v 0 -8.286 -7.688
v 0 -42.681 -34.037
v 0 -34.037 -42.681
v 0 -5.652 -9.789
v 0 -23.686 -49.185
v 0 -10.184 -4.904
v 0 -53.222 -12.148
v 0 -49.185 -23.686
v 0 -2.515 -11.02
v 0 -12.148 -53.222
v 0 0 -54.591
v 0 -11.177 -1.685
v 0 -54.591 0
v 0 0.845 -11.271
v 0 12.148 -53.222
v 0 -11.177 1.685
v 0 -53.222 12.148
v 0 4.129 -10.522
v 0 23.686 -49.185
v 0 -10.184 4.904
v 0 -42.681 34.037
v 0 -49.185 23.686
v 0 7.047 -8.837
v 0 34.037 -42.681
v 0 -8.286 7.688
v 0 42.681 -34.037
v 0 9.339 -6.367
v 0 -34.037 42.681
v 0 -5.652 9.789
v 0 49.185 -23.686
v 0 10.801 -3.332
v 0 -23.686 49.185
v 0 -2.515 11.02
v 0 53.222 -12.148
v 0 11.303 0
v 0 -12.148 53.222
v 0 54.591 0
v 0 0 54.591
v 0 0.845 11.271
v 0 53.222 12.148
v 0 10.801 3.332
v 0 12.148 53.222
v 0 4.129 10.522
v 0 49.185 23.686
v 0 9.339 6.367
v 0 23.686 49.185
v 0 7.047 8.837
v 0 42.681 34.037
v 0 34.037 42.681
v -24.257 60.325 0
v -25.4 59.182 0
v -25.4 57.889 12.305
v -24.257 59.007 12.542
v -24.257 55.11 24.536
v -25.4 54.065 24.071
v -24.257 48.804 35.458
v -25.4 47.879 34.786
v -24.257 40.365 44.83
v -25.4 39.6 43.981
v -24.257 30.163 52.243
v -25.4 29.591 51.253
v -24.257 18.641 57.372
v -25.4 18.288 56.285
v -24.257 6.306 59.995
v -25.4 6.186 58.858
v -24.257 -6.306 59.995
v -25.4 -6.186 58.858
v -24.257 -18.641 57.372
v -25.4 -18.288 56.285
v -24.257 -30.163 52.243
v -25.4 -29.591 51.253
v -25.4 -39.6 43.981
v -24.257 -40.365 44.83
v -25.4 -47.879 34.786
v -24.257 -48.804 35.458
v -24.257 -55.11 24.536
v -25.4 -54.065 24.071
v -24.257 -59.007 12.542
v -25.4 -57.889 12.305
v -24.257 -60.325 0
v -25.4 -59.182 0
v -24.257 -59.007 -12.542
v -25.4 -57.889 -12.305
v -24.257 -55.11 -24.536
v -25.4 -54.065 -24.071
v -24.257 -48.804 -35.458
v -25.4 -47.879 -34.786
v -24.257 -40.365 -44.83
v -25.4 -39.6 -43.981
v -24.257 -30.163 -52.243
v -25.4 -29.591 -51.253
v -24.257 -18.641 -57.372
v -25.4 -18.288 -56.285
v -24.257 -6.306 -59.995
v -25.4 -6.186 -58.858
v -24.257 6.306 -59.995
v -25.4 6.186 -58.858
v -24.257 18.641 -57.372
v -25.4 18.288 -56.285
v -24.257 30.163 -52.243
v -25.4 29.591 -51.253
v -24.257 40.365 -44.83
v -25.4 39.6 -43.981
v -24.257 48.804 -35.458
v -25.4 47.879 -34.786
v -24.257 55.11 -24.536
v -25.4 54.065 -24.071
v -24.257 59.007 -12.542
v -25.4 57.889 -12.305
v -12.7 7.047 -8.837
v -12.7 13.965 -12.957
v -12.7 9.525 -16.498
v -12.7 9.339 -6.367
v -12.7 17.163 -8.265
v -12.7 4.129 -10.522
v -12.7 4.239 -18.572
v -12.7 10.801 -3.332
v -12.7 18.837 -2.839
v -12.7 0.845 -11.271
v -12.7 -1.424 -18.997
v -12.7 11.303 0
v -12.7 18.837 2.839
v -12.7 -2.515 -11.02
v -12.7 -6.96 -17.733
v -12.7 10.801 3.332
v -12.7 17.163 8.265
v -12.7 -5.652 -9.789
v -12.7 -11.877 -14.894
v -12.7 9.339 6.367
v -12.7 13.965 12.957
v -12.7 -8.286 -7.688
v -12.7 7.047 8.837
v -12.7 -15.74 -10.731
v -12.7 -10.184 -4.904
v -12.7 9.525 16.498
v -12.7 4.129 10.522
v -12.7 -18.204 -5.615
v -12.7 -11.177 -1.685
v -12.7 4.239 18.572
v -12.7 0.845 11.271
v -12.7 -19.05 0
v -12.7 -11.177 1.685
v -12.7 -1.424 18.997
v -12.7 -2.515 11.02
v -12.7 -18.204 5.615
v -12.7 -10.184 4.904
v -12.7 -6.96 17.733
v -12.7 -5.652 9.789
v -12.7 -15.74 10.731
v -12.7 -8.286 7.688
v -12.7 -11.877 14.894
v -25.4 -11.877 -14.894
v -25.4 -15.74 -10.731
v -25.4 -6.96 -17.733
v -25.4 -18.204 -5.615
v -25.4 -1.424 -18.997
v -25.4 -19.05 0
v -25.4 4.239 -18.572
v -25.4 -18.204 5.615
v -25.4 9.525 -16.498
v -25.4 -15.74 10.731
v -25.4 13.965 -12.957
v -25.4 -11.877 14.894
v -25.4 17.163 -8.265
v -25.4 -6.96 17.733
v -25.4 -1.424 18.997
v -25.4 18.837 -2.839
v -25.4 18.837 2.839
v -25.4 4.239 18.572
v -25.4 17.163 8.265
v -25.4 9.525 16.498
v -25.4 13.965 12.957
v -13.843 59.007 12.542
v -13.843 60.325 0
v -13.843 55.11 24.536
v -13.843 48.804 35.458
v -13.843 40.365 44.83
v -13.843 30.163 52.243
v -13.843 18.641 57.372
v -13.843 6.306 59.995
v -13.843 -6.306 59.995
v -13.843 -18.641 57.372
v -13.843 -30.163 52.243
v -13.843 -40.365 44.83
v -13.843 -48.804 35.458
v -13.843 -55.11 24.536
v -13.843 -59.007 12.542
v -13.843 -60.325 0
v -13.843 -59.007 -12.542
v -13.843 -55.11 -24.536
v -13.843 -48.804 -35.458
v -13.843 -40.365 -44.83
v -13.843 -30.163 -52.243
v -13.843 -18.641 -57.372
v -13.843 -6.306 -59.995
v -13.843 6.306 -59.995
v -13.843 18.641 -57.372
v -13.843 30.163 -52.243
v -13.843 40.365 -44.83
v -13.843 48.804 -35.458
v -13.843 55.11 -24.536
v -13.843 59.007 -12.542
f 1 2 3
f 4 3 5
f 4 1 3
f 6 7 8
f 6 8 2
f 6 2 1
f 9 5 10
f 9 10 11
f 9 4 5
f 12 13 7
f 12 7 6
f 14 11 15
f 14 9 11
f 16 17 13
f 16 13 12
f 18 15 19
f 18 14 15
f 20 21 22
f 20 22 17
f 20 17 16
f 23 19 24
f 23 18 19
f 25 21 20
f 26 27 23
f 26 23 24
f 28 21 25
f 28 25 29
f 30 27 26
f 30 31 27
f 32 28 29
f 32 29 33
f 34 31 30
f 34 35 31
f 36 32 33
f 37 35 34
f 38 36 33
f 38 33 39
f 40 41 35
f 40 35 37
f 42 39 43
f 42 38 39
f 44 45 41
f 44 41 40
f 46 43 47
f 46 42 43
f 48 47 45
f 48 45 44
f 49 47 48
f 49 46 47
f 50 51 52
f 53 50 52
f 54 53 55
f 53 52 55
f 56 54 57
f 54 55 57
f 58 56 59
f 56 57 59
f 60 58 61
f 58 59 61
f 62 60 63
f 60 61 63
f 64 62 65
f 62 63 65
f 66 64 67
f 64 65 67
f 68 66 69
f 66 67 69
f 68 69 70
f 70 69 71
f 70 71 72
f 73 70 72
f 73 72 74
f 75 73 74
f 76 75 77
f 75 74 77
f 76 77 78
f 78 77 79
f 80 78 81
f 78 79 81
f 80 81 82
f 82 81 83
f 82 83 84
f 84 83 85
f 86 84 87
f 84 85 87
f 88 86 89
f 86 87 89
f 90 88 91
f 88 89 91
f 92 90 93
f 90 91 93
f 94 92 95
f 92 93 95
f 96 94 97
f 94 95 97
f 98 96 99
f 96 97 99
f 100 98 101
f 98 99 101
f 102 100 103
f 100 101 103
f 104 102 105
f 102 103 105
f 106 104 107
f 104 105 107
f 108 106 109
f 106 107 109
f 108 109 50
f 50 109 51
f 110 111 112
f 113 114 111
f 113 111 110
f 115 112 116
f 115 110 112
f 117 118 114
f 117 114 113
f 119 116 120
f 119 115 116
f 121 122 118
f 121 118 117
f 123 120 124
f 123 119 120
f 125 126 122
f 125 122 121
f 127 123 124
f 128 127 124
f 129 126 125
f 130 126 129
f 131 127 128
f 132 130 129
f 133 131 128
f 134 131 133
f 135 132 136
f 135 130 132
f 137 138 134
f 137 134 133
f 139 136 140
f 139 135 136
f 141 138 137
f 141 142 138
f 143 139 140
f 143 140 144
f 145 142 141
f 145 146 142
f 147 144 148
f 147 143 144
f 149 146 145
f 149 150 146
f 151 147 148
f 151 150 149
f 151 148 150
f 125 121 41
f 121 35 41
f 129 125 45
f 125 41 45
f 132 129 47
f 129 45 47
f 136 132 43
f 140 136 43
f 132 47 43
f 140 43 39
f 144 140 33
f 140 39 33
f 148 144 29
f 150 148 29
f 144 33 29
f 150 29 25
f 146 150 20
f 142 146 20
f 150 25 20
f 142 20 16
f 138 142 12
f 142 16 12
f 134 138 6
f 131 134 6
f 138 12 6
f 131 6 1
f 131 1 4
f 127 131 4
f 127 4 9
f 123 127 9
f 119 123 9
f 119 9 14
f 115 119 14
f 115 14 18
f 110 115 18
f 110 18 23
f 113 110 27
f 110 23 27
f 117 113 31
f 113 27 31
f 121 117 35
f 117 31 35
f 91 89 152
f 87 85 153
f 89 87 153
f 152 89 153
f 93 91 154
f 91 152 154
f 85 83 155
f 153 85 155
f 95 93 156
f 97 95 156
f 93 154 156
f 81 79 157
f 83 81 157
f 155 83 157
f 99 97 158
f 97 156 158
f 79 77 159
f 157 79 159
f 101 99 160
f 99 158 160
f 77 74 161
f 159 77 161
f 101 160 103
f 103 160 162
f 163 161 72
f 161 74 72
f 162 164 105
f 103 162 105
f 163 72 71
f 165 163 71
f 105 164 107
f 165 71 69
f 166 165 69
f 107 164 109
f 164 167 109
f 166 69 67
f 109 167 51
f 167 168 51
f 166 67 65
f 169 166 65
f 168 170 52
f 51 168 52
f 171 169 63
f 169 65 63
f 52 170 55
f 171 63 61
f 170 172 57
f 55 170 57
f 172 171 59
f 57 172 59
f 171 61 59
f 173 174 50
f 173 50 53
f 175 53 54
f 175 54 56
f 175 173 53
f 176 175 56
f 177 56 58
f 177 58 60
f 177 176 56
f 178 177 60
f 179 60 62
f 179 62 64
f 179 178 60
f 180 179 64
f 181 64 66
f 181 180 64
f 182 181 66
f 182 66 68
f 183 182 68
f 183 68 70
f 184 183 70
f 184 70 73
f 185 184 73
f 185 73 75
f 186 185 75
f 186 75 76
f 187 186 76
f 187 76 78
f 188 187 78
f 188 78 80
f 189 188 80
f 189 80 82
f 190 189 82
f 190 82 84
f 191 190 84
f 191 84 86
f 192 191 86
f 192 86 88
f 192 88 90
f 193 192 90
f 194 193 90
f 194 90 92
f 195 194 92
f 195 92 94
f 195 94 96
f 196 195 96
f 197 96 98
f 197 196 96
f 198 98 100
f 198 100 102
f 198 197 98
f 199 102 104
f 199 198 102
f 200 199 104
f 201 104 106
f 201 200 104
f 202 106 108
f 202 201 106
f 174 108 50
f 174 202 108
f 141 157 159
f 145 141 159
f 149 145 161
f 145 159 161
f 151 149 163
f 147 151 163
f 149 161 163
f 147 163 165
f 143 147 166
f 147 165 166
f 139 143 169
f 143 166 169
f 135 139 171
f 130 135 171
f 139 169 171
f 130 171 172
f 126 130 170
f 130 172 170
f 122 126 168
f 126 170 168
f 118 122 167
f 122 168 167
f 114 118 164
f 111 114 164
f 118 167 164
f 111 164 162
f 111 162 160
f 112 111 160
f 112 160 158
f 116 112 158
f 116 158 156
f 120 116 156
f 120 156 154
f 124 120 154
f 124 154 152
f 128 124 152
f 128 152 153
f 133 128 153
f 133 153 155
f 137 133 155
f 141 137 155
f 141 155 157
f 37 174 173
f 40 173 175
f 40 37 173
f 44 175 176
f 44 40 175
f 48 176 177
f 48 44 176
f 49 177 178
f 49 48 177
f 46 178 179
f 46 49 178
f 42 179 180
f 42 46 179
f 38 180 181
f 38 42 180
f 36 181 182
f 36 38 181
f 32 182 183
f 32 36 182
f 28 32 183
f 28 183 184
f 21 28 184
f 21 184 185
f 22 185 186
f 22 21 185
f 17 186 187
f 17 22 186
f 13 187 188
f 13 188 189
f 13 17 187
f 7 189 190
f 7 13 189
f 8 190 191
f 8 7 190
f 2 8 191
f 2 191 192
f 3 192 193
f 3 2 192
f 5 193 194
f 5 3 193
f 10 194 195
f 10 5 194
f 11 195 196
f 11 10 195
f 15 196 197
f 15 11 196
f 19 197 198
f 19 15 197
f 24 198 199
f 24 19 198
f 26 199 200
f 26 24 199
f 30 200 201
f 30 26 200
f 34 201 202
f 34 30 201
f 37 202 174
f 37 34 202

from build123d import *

# Parameters (mm, degrees)
F0_R           = 60.325
F1_DEPTH       = 25.4
F2_SIZE        = 1.143
F4_D           = 22.606
F4_CBORE_D     = 38.1
F4_CBORE_DEPTH = 12.7


# Not quite as in the source:
# - a fillet or chamfer that OpenCascade refuses, or shapes differently, is made with other operations: its cross-section is extruded or revolved along the edge and cut away or added


with BuildPart() as f1:
    # F0 (on Right) → F1 (new body)
    with BuildSketch(Plane.YZ):
        Circle(F0_R)
    extrude(amount=-F1_DEPTH)

    # F2
    f2_edges = [f1.edges().sort_by_distance(p)[0] for p in [
        (-25.4, -60.325, 0),
        (-12.7, 60.325, 0),
        (0, -60.325, 0),
    ]]
    chamfer(f2_edges, length=F2_SIZE)

    # F4 (through all)
    with Locations(Plane(origin=(-25.4, 0, 0), x_dir=(0, -1, 0), z_dir=(-1, 0, 0))):
        with Locations((0, 0)):
            CounterBoreHole(F4_D / 2, F4_CBORE_D / 2, F4_CBORE_DEPTH)

    # F5: chamfer of 12.7 on 1 edges, made by hand

    # F5_s1 → F5_t2 (revolve, cut)
    with BuildSketch(Plane.XY):
        Polygon((-13.843, 60.325), (7.8372561211, 51.3447438789), (-1.143, 60.325), align=None)
    revolve(axis=Axis((-1.143, 0, 0), (1, 0, 0)), mode=Mode.SUBTRACT)


solid = f1.part
